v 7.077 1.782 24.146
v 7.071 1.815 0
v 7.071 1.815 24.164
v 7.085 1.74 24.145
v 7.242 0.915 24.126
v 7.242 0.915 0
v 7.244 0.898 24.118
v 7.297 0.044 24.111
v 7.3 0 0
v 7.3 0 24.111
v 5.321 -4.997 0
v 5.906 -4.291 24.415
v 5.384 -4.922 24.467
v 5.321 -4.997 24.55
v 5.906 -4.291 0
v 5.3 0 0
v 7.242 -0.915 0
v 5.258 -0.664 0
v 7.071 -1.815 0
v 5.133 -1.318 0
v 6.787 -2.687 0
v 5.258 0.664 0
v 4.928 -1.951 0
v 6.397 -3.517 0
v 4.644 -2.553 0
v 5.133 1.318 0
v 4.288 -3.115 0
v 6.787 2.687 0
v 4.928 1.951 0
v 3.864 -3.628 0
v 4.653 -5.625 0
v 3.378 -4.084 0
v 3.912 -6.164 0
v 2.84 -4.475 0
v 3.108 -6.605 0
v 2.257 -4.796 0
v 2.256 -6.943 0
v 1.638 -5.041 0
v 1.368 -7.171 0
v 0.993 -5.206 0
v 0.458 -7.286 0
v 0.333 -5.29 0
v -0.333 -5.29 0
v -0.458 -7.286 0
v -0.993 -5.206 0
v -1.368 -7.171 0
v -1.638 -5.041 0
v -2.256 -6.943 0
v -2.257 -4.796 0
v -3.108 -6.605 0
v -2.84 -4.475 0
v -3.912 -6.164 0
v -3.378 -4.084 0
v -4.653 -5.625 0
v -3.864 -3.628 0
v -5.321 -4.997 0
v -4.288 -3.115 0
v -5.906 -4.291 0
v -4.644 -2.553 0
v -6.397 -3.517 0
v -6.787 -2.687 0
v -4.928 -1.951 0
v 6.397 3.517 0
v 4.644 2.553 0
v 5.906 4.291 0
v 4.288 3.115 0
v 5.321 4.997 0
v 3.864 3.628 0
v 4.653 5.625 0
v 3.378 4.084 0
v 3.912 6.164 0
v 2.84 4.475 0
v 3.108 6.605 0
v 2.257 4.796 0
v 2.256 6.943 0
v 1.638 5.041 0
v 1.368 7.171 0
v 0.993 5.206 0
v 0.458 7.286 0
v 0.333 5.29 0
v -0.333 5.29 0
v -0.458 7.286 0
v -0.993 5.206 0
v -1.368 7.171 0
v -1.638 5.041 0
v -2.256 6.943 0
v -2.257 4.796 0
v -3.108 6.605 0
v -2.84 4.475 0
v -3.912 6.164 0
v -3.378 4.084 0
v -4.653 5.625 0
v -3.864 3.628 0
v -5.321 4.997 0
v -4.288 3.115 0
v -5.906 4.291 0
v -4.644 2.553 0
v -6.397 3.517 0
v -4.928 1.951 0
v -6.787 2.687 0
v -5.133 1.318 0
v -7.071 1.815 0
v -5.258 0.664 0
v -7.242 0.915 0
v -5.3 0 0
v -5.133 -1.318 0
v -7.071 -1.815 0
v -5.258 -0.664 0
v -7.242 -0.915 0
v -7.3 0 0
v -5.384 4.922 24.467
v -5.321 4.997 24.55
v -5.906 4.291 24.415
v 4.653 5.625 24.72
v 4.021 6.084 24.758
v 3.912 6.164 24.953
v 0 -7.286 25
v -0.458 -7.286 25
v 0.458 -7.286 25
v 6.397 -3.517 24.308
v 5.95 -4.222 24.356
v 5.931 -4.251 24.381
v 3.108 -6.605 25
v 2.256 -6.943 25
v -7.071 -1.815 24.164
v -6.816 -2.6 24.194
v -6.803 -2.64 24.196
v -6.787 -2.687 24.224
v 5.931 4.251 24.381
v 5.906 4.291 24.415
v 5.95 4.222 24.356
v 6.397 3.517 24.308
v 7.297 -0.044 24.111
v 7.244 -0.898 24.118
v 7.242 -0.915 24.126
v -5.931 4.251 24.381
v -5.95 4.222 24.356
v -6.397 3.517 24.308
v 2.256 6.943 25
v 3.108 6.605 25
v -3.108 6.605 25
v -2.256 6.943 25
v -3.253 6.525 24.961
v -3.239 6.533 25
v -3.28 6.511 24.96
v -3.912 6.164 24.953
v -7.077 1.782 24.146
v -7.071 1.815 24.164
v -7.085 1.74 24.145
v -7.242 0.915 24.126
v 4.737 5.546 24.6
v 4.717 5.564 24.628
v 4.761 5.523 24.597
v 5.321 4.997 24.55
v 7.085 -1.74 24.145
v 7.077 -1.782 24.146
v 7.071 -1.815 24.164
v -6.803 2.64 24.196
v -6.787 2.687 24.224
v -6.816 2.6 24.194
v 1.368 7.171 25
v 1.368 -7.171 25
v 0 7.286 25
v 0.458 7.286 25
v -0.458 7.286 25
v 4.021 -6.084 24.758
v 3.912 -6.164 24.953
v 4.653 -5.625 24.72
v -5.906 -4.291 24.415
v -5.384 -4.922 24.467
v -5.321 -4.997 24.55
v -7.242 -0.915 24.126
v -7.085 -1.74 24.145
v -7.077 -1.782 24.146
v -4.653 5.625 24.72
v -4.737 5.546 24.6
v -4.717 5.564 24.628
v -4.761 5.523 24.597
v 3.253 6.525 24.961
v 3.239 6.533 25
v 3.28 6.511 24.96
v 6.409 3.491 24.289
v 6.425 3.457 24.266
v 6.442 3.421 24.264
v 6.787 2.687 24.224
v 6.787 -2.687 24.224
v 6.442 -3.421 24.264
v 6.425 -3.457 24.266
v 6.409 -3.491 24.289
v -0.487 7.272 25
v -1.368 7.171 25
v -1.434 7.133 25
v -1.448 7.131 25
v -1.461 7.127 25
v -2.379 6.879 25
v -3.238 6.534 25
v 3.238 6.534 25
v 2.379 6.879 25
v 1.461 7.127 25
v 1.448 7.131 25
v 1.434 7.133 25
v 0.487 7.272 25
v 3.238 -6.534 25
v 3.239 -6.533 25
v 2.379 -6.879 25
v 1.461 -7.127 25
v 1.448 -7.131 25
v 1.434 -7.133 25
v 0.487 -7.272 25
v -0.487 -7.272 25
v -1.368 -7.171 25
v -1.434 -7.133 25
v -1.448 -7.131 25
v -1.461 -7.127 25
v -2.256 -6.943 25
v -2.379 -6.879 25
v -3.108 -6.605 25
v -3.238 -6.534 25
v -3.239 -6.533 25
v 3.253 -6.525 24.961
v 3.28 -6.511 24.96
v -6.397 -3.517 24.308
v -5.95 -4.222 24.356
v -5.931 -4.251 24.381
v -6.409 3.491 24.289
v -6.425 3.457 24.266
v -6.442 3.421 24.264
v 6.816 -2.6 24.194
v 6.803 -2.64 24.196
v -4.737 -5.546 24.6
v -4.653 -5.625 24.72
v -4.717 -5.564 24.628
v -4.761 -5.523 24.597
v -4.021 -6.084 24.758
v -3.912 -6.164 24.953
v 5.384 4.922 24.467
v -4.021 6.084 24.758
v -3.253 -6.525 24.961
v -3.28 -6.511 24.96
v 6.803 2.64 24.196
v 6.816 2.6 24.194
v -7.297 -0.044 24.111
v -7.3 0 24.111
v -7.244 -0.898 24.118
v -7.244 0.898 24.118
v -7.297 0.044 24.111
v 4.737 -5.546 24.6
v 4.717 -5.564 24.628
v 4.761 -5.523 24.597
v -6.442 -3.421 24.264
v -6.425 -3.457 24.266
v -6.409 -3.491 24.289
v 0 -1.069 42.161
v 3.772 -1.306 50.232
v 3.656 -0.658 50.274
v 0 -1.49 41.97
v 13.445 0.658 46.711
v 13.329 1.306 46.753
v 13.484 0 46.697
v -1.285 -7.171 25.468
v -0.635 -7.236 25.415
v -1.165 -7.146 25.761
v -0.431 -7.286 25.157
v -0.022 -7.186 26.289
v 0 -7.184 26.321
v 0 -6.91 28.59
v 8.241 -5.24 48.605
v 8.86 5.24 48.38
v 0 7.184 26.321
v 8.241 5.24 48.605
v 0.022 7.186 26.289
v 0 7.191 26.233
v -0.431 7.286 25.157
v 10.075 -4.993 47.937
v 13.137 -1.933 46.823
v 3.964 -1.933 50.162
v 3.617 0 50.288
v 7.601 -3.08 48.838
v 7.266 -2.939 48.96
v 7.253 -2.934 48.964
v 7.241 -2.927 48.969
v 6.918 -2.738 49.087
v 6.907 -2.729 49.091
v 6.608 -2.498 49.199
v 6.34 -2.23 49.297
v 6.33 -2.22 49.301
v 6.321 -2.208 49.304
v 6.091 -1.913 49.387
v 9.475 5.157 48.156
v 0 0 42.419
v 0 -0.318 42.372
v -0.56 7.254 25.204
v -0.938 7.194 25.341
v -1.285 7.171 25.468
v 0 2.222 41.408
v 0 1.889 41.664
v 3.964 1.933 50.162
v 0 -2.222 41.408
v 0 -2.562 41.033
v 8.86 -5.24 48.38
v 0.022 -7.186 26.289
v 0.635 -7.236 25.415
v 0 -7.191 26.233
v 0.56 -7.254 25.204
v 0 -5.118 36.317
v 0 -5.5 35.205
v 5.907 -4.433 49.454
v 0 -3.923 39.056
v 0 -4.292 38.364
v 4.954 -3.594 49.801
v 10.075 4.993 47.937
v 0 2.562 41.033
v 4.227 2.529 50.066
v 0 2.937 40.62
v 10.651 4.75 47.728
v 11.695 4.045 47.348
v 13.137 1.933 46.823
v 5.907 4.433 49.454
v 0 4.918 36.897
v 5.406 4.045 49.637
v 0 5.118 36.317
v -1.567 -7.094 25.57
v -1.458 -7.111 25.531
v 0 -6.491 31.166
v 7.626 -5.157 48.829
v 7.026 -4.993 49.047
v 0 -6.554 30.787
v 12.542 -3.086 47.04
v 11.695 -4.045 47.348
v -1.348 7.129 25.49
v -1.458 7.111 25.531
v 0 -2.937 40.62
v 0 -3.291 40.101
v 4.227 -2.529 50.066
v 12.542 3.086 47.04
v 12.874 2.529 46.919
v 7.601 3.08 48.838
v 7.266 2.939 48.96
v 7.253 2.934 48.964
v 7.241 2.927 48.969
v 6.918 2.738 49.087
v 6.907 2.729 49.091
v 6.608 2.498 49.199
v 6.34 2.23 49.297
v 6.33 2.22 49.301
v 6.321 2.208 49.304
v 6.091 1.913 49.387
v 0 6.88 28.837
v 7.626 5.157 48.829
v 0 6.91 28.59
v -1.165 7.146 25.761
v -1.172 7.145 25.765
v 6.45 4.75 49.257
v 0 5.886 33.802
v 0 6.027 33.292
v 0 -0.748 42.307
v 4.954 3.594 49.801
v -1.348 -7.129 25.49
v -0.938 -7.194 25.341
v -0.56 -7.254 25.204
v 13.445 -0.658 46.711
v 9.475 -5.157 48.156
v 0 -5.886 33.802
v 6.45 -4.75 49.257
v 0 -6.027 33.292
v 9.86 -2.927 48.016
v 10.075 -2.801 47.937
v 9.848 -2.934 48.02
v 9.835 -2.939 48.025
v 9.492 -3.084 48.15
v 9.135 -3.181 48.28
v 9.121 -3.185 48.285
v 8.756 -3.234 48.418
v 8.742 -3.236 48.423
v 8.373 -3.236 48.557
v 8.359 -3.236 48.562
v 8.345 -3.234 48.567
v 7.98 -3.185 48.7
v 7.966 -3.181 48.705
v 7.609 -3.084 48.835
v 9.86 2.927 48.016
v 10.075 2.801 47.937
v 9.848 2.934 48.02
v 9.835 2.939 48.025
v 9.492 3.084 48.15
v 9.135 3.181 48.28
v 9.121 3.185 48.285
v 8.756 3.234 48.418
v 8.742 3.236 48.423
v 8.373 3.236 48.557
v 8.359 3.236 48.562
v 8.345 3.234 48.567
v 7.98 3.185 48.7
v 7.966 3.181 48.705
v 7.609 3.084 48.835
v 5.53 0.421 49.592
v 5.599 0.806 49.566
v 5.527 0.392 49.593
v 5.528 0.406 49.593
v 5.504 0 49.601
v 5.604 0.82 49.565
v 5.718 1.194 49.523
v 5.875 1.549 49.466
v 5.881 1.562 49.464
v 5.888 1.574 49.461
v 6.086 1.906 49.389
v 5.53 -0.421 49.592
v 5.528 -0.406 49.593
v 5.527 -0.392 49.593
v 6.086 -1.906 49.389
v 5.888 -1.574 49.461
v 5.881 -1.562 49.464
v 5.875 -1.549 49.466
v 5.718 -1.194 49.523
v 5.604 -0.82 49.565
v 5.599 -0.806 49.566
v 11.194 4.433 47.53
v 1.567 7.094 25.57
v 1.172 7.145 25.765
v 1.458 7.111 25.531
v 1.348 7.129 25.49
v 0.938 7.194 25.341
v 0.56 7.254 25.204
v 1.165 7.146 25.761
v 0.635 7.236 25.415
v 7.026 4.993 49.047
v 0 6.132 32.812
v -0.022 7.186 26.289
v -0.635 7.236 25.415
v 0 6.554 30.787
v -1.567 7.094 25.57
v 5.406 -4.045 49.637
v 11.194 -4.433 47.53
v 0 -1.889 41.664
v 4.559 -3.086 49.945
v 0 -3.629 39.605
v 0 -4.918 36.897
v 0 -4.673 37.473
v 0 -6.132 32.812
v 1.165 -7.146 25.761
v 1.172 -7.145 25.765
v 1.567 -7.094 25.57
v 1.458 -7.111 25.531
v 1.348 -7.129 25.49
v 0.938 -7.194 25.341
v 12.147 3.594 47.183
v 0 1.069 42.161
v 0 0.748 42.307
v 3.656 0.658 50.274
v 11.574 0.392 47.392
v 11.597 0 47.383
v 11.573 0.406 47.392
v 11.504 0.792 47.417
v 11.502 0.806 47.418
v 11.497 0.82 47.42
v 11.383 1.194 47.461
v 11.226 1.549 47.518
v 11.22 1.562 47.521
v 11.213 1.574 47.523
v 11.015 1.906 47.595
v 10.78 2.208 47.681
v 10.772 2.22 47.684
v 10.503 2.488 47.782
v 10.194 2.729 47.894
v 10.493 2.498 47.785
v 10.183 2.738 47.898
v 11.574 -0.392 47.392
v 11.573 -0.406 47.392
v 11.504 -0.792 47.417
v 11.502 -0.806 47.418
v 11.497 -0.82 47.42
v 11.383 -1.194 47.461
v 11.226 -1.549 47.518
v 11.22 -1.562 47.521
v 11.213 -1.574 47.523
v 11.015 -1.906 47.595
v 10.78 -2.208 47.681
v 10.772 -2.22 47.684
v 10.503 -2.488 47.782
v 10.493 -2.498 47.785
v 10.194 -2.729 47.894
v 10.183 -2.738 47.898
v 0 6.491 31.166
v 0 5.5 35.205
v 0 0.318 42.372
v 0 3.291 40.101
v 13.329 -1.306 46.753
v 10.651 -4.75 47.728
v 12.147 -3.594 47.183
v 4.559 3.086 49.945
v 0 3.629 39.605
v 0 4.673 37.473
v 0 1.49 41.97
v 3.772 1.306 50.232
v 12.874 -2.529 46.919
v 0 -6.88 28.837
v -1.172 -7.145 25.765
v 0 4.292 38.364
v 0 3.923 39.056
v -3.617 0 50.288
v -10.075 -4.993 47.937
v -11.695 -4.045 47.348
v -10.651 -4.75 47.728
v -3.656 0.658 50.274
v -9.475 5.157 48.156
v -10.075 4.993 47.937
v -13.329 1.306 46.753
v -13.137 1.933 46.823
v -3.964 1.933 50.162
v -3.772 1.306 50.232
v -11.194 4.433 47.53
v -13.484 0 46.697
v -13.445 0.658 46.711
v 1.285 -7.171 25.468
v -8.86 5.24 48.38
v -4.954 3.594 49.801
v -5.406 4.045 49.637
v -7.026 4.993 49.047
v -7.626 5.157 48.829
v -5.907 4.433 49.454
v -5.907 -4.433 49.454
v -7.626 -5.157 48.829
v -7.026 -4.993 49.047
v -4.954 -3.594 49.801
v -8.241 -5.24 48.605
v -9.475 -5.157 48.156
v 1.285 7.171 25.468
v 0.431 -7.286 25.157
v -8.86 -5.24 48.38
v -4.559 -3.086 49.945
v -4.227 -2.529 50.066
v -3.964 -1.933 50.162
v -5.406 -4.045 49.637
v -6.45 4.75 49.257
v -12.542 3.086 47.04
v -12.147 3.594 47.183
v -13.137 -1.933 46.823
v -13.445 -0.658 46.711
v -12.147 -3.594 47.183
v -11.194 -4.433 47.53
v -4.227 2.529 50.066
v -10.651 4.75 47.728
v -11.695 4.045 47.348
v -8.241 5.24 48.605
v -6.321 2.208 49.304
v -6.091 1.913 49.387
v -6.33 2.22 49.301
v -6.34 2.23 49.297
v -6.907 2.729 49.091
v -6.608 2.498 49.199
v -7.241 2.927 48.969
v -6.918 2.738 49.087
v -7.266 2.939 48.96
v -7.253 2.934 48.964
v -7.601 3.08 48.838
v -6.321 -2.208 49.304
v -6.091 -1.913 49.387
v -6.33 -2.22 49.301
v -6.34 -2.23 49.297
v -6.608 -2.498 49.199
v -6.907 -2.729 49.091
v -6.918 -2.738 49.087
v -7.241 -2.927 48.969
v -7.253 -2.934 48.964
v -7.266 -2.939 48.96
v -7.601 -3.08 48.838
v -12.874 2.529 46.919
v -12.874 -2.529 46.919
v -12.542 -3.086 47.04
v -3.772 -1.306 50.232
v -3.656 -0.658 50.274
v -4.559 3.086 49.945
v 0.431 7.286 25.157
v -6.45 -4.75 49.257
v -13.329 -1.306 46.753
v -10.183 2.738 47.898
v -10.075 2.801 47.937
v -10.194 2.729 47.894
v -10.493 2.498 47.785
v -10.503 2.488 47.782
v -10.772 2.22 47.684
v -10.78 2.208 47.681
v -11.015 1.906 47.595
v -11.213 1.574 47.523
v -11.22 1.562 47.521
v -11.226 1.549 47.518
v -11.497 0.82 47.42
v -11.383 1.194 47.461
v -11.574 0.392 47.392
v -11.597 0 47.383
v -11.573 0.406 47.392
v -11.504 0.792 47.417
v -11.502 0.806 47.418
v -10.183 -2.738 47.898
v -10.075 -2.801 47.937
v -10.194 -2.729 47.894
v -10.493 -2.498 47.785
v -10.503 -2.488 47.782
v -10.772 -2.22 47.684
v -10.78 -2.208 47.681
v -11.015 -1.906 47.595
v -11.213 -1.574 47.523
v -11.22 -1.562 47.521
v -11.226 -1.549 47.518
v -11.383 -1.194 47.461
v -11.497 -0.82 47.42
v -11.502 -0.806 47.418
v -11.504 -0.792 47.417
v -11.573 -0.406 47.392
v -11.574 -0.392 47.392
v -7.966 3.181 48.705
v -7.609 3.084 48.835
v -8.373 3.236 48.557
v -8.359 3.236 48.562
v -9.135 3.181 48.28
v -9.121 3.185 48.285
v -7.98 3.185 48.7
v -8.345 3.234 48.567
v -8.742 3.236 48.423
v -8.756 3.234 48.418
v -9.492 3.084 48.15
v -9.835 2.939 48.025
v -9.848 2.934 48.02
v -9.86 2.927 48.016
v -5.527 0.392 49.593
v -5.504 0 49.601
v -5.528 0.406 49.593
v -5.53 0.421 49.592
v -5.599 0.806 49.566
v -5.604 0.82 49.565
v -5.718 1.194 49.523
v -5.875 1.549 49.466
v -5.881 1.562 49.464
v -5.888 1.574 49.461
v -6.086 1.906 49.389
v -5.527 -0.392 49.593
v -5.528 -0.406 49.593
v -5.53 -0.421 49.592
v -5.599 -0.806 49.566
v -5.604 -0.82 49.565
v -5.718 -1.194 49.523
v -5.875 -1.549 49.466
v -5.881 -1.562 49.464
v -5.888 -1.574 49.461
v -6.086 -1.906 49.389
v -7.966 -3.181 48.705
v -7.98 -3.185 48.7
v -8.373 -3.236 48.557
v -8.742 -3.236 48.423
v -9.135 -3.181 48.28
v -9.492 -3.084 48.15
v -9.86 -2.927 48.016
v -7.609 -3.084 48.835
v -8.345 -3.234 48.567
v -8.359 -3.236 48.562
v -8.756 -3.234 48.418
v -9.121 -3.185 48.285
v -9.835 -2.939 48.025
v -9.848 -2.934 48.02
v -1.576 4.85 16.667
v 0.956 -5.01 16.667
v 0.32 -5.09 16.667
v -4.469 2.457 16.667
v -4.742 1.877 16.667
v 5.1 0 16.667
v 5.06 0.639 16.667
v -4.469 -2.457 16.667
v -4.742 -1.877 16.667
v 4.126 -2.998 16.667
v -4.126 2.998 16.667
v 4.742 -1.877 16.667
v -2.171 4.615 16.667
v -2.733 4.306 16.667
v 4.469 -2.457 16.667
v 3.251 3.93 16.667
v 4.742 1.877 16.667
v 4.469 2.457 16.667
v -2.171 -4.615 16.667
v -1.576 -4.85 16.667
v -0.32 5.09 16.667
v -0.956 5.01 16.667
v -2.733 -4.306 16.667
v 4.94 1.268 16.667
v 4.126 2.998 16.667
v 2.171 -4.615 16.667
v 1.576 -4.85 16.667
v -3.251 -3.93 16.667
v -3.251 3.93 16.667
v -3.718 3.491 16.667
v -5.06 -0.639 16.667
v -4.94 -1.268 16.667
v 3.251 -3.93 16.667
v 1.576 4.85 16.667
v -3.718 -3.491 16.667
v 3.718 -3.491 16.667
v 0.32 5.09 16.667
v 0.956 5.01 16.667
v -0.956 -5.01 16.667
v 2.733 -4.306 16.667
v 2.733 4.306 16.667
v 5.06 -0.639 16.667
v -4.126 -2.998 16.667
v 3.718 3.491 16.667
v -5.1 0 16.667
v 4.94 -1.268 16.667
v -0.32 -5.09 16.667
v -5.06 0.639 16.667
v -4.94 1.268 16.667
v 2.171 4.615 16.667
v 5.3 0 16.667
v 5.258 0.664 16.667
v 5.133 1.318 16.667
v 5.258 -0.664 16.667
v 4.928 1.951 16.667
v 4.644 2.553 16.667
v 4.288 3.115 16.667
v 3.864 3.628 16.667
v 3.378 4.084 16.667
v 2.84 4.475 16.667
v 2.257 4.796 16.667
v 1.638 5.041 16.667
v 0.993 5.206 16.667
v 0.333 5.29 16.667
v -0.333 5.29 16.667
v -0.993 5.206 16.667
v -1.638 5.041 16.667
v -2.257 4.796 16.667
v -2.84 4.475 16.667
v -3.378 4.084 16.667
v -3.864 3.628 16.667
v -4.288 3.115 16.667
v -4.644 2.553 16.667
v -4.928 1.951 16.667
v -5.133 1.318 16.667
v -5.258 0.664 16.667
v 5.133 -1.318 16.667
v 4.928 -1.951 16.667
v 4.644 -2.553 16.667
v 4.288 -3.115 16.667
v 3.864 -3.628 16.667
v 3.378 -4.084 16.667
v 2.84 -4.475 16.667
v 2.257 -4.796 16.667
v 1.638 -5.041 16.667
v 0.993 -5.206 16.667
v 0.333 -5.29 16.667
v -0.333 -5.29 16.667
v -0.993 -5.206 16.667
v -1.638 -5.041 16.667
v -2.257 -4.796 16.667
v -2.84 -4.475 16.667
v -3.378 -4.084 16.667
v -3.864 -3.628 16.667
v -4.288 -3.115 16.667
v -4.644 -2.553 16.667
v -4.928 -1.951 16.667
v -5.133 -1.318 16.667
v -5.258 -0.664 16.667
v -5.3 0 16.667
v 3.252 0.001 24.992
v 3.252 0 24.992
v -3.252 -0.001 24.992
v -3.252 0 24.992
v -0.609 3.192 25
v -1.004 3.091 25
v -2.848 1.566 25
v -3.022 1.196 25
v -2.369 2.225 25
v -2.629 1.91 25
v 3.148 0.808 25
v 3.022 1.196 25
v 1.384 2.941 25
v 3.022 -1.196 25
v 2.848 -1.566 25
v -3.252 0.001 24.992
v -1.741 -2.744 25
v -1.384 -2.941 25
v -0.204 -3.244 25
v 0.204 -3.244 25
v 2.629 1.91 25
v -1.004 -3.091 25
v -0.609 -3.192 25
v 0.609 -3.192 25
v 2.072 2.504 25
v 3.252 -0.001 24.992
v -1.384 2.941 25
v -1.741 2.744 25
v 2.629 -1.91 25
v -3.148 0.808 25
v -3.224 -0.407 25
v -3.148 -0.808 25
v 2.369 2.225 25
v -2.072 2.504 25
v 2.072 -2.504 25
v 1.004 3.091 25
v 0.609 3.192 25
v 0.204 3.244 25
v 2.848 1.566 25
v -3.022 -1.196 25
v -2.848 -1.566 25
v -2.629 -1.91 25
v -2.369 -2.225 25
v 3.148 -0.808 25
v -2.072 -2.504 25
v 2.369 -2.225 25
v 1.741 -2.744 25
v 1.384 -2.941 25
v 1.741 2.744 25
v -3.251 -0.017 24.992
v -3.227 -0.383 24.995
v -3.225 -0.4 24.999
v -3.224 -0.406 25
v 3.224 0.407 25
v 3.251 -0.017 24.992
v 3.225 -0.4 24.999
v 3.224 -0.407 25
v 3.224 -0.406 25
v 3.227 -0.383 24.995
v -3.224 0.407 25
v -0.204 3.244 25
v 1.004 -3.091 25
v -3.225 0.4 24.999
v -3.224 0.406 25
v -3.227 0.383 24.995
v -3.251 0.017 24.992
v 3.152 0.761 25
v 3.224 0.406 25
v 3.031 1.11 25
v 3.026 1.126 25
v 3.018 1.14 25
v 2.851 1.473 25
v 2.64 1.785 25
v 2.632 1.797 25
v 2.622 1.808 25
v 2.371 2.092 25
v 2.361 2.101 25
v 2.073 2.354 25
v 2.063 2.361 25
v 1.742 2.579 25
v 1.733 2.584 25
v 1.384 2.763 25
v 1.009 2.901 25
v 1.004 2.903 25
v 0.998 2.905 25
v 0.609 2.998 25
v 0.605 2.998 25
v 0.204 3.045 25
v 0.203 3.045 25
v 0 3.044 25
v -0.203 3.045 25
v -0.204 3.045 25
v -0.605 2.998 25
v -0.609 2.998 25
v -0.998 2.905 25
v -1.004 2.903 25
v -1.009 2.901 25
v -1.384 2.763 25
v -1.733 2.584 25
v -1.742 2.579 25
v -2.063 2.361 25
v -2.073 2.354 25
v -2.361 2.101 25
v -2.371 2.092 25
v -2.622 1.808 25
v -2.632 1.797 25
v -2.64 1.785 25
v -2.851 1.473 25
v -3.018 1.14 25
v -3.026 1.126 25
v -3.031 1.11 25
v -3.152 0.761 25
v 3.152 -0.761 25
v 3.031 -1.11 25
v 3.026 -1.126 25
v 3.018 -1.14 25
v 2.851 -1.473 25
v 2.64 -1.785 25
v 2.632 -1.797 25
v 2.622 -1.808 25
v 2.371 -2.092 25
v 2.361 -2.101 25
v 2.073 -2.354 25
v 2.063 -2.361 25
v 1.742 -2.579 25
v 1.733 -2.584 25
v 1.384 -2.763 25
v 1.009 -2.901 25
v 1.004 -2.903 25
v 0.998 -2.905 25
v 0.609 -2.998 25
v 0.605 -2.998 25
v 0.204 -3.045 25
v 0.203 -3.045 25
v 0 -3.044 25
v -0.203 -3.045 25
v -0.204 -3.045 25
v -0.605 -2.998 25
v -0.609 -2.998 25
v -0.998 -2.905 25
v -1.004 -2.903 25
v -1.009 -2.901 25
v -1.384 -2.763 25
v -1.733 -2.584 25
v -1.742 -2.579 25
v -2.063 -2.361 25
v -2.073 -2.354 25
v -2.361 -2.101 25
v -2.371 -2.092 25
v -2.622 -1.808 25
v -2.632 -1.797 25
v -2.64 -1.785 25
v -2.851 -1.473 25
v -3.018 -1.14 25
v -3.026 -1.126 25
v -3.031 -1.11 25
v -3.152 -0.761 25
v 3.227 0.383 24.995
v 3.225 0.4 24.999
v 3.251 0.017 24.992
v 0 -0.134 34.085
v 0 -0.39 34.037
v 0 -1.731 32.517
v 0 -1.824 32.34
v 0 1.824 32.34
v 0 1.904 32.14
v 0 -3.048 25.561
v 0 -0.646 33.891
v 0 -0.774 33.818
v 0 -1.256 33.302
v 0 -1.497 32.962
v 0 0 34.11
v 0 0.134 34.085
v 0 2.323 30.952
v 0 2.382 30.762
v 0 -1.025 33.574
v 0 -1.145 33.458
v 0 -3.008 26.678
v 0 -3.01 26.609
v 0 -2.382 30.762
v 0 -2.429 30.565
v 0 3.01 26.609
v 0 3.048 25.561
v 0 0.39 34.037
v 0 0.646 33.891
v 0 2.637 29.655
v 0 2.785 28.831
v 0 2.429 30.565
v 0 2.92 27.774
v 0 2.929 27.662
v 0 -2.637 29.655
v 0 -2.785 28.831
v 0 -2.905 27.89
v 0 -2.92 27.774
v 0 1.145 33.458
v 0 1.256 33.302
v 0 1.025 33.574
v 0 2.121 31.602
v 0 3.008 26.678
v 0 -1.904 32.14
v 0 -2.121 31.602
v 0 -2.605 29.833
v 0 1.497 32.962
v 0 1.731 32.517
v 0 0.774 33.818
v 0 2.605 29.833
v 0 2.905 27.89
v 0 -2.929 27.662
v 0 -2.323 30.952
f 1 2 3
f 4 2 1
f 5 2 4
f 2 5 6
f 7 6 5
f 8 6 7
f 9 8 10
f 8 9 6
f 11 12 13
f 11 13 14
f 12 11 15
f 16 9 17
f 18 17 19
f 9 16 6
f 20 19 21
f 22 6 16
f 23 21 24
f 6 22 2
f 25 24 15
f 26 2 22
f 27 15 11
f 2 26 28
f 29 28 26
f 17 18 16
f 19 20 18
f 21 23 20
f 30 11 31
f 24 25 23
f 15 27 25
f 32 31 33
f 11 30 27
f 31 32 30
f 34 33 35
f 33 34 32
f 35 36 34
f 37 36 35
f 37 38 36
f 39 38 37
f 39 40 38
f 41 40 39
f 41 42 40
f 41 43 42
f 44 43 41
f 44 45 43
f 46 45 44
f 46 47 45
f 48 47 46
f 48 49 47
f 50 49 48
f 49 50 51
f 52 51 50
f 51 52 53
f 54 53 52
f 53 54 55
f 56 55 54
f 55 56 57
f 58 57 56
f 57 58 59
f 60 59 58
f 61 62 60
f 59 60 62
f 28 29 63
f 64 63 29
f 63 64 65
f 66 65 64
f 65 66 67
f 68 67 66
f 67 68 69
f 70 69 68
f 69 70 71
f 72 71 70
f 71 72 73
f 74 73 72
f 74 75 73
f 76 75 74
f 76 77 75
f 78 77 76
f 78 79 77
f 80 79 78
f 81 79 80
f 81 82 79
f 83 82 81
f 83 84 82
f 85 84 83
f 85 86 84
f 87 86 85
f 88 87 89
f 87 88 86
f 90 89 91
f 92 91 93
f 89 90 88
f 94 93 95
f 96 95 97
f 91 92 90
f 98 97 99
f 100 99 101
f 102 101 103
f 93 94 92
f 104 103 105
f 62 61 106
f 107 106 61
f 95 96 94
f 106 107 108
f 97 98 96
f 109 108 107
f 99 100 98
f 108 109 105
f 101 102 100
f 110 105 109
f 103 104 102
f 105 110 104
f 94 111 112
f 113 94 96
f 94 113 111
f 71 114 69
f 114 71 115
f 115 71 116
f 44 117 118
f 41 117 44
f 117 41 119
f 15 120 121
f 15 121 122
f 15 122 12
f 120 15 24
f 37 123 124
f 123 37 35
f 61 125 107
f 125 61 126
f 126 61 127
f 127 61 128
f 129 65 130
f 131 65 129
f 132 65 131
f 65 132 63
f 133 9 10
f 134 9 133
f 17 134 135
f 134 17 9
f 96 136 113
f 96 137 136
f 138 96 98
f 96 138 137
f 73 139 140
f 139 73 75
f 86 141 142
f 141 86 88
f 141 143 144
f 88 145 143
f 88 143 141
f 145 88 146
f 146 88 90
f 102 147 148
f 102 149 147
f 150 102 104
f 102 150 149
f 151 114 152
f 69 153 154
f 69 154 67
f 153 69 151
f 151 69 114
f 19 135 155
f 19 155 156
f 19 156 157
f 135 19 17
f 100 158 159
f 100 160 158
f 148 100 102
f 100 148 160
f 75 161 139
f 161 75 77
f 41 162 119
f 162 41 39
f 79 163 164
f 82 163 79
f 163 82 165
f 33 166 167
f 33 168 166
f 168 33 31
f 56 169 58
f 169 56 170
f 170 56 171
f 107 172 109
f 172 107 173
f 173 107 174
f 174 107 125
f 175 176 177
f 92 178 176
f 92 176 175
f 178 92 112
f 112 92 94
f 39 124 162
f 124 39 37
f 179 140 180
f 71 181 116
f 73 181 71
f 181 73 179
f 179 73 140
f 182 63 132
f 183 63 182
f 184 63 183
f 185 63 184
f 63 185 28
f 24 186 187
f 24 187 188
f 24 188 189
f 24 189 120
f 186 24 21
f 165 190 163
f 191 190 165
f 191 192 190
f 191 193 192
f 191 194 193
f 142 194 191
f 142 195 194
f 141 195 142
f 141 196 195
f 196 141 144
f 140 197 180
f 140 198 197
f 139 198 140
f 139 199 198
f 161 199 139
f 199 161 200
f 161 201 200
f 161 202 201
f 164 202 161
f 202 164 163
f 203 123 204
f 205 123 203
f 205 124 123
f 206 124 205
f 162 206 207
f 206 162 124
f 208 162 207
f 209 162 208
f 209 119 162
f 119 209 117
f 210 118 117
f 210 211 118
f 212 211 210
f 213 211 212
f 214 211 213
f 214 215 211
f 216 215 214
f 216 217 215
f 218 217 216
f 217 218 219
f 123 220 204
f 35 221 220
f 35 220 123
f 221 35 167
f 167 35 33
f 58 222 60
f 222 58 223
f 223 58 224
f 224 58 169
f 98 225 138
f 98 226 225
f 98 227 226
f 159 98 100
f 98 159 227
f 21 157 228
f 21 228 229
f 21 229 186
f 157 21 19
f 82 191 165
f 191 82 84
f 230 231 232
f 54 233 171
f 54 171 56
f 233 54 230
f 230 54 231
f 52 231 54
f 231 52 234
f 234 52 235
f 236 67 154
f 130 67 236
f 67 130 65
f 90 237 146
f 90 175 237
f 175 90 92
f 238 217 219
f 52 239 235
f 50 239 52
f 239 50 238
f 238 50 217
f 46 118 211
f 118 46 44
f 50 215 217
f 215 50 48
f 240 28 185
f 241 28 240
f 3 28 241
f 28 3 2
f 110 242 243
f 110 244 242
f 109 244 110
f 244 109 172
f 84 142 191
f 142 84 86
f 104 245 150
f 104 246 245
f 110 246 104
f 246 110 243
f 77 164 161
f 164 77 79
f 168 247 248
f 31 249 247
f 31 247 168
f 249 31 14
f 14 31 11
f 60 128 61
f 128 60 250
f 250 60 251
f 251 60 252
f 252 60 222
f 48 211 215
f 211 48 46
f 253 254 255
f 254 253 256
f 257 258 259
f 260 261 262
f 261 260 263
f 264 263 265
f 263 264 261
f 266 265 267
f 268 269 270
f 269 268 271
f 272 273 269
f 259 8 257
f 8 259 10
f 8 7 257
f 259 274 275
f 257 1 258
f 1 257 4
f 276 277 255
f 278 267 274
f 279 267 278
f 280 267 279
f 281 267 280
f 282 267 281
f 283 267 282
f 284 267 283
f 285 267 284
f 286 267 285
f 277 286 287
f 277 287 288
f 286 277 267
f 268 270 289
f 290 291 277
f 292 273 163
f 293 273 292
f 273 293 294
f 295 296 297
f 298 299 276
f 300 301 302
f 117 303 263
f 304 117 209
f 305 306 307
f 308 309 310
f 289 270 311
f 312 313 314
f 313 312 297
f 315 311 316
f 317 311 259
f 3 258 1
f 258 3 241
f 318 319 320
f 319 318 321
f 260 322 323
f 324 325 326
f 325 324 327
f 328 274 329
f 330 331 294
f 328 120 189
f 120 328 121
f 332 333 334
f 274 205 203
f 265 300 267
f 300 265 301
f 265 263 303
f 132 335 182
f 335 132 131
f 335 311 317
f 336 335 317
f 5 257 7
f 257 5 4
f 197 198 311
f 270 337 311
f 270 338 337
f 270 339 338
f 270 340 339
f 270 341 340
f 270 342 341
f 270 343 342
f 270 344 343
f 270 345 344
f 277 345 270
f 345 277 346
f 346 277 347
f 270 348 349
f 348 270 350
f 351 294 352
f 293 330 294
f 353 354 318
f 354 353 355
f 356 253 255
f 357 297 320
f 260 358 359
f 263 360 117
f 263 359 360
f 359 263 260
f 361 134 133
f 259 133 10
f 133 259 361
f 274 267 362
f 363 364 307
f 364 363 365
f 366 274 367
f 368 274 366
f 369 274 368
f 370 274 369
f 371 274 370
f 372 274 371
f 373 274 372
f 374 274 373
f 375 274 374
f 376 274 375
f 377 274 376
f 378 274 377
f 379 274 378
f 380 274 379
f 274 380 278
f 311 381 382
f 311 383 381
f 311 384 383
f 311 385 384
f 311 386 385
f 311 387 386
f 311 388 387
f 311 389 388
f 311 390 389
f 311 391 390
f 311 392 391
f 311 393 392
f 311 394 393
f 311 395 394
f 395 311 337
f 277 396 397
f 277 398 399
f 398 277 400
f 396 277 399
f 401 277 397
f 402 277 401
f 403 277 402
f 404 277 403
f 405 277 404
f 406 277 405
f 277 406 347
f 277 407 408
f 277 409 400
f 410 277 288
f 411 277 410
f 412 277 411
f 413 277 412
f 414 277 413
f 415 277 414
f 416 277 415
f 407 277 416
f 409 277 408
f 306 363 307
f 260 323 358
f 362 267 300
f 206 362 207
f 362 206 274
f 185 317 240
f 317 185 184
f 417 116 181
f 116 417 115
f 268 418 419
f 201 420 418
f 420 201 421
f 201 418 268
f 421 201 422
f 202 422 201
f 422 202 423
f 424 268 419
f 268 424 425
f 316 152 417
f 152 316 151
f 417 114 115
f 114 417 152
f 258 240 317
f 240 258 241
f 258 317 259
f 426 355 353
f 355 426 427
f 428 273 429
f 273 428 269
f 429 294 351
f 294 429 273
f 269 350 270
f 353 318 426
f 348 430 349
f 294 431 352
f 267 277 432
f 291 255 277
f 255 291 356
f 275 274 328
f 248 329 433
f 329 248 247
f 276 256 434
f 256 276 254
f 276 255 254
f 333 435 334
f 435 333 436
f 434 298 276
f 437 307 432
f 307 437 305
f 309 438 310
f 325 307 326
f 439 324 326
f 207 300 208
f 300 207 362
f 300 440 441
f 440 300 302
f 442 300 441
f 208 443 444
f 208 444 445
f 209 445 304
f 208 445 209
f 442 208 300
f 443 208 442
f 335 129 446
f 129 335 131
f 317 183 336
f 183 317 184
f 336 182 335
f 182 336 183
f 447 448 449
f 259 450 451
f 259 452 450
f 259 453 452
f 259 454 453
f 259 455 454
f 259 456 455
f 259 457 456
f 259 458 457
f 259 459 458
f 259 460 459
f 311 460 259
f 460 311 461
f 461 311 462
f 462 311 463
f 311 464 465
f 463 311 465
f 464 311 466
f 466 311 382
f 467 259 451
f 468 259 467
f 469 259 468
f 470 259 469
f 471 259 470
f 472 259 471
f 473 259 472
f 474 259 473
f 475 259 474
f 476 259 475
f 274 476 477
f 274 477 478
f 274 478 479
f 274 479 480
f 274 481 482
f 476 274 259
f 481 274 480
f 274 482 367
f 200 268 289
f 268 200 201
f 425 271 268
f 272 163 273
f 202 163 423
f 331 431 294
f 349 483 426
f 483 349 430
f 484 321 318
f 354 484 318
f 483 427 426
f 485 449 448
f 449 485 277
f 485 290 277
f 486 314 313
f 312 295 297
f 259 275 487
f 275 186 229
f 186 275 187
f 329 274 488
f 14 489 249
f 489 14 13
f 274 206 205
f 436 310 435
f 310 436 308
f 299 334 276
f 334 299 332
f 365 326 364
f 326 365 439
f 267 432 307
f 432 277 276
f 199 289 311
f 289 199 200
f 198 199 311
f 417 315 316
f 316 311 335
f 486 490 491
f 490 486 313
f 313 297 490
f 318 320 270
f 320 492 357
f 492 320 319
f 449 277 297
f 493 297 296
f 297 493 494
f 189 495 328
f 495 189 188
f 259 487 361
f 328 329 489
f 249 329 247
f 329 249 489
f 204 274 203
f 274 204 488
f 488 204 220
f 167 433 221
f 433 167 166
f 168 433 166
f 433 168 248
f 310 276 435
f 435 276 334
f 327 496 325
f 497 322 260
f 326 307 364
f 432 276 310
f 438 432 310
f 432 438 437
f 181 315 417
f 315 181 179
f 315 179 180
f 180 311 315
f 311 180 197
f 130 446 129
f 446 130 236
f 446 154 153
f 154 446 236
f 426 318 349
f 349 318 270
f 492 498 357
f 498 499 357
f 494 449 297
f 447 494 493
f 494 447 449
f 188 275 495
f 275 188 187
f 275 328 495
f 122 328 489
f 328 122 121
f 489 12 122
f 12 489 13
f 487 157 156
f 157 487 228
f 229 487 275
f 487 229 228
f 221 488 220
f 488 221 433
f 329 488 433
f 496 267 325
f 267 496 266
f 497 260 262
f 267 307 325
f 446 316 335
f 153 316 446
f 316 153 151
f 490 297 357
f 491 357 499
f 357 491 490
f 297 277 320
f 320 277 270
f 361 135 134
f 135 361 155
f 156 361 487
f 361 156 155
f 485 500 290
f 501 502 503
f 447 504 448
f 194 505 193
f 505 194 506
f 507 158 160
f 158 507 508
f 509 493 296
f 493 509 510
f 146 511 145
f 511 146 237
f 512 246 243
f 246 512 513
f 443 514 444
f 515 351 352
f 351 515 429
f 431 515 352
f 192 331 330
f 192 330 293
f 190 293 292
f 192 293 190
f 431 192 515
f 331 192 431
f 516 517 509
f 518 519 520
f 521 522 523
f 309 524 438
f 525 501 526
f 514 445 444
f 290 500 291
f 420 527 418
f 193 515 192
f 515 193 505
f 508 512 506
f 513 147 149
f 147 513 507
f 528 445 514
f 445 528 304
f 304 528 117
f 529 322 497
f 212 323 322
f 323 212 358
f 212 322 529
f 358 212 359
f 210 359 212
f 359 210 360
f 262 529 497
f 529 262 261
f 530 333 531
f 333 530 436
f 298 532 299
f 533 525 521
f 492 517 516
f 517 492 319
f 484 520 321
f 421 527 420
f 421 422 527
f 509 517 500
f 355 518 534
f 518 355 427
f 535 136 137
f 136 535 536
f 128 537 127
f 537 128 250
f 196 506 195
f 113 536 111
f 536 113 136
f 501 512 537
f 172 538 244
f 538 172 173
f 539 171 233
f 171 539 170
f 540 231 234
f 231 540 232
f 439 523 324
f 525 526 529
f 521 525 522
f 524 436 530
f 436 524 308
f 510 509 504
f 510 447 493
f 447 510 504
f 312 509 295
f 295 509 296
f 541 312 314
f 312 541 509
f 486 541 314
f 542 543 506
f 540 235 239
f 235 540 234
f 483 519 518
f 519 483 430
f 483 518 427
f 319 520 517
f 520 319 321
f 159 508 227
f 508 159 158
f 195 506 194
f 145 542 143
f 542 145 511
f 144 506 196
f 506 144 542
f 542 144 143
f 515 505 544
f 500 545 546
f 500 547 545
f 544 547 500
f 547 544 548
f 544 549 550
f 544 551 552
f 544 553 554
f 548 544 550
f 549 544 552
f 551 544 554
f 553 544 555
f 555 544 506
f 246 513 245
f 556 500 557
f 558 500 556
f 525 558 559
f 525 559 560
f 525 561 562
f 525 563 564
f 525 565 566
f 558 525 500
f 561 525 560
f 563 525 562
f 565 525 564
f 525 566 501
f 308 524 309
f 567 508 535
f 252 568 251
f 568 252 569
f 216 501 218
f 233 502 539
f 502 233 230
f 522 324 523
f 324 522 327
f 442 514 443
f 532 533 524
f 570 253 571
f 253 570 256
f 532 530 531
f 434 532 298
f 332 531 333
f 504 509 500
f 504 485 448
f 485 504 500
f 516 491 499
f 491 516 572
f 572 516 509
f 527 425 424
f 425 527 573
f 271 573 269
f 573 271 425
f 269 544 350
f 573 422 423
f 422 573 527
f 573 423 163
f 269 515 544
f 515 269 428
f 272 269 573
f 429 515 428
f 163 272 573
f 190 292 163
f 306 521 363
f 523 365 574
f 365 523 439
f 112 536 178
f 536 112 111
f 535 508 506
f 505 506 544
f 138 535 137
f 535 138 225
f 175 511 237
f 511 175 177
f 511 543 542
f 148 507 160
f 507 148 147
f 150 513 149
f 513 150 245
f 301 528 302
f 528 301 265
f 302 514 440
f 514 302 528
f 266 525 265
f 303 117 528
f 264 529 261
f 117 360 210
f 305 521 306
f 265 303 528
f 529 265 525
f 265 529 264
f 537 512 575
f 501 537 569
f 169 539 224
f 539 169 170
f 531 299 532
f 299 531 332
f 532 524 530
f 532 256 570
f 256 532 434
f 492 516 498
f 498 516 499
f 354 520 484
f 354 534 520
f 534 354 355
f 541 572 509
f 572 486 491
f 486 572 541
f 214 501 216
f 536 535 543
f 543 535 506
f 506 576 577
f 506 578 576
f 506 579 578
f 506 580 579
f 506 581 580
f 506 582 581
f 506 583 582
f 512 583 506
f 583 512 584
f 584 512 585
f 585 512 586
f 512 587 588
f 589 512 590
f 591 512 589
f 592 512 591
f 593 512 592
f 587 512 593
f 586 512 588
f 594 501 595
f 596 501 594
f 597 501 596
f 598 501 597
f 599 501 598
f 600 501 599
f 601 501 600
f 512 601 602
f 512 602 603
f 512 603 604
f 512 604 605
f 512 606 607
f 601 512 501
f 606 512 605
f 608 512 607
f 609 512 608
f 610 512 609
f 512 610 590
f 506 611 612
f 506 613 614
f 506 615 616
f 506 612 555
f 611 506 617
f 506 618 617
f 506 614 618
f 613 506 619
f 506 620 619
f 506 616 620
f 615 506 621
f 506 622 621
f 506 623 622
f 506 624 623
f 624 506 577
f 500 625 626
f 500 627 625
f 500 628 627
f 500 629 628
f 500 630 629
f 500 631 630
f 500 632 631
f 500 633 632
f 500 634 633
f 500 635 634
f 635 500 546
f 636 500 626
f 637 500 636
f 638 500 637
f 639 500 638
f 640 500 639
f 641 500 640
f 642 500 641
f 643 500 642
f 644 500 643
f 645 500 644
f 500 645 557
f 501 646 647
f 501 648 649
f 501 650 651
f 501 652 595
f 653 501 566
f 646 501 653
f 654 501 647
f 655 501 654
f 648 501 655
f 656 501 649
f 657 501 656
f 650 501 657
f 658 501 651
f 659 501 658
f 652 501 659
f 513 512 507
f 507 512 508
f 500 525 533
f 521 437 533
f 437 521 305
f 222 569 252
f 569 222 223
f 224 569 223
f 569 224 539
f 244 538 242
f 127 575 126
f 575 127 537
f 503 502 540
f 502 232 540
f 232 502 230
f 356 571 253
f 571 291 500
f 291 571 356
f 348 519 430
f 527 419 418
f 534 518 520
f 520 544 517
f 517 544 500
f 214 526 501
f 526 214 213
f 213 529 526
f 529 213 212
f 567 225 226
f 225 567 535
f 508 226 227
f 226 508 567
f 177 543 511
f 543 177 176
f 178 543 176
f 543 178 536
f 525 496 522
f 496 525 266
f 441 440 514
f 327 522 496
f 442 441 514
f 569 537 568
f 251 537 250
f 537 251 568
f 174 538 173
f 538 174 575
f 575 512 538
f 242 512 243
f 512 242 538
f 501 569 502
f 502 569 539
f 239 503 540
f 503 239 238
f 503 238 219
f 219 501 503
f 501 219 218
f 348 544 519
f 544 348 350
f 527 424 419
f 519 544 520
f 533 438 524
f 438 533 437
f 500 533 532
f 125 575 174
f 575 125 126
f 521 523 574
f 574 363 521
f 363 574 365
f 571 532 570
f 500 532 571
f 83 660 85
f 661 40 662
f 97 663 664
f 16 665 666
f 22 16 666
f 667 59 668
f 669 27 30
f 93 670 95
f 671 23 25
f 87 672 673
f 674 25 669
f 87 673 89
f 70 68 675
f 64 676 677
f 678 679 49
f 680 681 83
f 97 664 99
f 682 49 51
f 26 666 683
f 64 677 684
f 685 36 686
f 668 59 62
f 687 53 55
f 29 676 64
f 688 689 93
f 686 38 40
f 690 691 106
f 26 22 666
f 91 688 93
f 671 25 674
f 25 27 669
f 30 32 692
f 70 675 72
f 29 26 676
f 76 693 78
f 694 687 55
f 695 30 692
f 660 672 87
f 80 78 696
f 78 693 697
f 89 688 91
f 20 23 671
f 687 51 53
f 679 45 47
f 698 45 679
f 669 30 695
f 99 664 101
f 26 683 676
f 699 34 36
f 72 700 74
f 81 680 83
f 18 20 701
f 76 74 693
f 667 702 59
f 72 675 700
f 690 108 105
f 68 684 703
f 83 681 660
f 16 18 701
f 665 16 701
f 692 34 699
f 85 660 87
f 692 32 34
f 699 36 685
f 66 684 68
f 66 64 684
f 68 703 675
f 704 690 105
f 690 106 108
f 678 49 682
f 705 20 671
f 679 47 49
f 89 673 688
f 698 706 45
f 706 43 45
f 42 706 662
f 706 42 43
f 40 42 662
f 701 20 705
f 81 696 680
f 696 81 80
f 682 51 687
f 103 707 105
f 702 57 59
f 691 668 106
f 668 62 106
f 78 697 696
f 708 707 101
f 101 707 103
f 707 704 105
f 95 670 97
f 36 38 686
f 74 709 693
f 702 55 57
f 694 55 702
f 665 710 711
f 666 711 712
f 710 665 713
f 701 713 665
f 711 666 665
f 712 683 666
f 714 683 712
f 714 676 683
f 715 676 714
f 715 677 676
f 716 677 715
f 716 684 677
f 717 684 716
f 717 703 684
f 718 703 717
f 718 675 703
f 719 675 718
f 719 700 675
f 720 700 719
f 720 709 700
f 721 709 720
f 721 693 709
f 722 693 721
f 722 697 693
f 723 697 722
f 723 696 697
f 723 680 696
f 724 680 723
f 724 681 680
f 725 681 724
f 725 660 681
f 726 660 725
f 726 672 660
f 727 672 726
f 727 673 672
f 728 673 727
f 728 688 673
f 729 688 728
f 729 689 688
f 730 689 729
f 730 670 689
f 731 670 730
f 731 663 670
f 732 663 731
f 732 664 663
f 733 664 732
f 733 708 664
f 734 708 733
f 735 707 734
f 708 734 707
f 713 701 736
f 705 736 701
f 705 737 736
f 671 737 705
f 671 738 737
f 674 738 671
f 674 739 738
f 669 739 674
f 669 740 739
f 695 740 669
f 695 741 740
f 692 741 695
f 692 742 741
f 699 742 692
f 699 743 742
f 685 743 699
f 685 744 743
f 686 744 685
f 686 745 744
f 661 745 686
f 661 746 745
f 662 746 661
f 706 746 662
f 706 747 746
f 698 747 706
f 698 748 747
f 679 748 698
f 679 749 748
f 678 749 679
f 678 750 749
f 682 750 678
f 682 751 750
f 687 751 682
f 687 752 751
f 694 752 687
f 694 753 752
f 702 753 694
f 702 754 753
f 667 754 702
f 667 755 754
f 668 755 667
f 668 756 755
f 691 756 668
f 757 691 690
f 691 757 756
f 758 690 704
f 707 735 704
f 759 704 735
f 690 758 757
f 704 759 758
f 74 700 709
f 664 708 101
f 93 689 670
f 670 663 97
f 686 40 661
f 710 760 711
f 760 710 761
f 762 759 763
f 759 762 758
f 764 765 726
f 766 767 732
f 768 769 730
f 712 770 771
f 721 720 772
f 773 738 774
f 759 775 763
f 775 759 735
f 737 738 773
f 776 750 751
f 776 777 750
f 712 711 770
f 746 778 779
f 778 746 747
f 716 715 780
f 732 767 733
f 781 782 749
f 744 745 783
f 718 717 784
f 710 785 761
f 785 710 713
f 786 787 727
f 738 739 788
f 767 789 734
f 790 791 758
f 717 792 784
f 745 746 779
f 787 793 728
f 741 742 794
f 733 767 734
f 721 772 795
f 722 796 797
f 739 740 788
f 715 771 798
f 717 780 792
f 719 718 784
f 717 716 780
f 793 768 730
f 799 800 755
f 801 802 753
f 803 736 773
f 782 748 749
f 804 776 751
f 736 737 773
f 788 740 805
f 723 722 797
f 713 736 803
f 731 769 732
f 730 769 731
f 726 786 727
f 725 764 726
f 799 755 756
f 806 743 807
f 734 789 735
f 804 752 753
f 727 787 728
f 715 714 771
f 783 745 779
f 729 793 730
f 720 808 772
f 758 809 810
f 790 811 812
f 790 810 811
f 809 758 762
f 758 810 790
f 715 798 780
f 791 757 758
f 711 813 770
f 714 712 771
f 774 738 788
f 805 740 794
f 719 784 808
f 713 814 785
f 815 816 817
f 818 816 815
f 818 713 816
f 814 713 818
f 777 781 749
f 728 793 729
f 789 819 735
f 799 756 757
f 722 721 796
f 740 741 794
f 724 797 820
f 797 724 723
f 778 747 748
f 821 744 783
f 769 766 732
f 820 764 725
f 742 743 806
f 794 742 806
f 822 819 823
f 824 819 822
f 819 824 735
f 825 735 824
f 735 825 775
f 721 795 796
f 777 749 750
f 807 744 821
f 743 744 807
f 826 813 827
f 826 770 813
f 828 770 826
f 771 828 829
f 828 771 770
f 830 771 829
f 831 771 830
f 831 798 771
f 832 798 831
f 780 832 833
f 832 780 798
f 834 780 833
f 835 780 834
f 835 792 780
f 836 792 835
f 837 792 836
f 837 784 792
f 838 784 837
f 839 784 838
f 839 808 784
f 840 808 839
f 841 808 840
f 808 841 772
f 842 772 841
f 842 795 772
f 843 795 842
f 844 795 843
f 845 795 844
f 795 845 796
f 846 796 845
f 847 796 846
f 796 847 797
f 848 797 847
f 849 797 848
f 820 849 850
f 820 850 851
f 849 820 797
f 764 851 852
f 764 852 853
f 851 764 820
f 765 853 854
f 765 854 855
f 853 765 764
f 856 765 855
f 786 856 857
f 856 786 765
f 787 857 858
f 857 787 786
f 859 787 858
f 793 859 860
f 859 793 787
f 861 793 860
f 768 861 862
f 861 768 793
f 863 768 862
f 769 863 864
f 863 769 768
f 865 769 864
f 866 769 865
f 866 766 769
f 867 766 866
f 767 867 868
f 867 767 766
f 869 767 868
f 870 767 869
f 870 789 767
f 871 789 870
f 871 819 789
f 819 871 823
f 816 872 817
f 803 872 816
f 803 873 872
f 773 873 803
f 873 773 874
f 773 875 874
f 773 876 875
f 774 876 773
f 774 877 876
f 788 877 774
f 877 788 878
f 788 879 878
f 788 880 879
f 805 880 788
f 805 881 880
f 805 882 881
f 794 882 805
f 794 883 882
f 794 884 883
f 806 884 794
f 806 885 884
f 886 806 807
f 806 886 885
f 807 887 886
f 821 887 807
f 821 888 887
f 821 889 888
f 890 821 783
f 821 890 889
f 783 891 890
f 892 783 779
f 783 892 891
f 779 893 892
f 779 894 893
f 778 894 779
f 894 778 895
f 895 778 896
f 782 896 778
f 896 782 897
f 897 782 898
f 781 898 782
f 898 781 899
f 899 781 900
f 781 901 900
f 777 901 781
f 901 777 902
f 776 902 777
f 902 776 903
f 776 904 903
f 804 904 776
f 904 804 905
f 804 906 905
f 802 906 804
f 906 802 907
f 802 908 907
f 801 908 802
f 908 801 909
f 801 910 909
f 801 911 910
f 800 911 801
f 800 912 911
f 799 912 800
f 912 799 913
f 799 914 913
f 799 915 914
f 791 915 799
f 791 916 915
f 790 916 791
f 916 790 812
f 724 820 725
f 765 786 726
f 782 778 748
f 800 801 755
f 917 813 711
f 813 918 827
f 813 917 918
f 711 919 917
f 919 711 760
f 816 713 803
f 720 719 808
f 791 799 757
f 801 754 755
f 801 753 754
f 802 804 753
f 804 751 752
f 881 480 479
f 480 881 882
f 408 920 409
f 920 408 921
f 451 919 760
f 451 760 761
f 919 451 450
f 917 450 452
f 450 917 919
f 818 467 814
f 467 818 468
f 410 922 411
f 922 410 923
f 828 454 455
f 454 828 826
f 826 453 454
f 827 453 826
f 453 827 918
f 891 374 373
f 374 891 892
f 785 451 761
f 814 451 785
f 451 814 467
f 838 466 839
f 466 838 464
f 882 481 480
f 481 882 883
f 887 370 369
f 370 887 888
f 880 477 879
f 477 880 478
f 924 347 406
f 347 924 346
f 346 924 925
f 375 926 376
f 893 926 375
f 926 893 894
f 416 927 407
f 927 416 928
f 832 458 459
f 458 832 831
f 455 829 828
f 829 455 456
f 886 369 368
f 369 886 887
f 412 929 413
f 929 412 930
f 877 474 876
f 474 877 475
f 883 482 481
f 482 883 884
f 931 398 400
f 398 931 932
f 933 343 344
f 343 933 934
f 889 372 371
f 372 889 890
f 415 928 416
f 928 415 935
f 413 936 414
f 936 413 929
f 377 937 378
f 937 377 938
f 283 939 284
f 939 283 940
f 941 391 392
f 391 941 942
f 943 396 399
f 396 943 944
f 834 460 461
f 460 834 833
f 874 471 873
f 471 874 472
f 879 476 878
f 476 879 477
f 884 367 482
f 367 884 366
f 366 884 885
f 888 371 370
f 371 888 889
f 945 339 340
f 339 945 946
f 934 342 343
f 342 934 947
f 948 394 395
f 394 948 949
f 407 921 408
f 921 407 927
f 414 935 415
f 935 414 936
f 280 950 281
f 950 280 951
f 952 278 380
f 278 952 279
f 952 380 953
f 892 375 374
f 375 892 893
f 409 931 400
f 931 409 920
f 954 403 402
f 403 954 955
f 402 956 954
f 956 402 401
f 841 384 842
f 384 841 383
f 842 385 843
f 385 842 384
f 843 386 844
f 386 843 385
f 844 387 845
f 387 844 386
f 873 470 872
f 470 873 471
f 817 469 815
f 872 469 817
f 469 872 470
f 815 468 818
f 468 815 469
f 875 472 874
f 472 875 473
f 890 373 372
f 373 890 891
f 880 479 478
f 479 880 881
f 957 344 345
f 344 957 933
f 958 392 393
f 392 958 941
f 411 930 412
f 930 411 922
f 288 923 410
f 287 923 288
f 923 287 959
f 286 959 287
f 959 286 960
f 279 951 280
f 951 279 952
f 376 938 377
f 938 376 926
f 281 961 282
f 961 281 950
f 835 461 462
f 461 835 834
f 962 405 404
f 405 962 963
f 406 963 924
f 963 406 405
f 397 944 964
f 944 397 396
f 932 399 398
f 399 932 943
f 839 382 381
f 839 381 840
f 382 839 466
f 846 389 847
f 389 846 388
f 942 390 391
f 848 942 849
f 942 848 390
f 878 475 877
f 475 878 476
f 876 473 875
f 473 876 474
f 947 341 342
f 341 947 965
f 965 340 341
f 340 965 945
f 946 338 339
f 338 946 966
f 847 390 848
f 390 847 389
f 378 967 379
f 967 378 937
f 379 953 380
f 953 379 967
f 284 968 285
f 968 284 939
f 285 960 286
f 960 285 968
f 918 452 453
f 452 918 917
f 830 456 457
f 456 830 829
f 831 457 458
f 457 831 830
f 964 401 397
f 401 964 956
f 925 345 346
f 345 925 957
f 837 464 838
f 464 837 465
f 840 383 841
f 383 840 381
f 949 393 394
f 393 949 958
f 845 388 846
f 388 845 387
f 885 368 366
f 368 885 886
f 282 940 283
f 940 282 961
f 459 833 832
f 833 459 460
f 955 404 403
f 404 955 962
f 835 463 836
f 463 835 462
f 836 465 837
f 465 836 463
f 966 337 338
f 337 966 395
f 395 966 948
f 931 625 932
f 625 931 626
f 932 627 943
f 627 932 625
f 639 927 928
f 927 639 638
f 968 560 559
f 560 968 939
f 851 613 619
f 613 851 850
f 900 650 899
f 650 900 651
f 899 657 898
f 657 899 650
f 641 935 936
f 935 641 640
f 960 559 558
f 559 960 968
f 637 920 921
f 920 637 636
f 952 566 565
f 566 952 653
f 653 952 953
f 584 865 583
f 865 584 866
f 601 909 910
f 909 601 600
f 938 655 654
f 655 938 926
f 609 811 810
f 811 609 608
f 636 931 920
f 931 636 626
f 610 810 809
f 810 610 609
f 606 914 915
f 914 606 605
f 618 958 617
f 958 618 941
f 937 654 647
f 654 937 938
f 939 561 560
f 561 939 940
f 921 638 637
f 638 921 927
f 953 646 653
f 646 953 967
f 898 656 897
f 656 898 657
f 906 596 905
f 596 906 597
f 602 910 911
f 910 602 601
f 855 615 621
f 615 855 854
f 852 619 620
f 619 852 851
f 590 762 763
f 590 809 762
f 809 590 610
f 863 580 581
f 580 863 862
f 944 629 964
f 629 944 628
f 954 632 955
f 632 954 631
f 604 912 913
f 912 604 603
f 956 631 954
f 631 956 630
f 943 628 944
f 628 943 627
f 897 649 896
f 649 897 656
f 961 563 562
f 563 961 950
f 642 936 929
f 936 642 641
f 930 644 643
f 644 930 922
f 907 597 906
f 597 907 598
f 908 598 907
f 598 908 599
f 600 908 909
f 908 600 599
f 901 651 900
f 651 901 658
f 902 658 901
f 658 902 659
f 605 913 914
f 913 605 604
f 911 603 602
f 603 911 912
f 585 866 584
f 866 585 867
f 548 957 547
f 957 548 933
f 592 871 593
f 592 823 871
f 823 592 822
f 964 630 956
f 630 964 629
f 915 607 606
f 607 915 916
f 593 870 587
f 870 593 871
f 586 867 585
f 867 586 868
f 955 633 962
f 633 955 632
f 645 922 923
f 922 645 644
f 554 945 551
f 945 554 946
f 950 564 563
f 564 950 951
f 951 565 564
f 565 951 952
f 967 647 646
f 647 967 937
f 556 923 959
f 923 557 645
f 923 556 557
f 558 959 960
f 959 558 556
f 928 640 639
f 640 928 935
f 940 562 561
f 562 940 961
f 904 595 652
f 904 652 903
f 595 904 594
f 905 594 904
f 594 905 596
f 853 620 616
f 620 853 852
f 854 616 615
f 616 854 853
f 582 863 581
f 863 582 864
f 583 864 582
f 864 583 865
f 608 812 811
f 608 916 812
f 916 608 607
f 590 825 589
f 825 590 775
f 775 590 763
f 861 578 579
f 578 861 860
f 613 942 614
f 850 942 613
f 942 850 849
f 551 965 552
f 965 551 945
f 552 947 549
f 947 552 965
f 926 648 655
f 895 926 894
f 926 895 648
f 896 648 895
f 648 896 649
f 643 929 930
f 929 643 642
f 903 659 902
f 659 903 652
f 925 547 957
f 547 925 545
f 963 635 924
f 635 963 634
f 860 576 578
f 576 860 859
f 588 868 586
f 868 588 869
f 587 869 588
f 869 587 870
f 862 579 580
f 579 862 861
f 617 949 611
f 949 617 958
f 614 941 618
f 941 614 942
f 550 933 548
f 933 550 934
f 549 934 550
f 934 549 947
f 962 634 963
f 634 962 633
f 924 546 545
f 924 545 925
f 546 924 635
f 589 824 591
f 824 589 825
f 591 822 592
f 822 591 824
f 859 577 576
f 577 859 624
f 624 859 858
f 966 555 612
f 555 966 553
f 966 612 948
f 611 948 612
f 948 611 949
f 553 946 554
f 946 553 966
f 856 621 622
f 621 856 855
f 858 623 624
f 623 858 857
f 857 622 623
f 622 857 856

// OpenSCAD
PRIMARY_TUBE_DIAMETER = 10.6;
PRIMARY_TUBE_HEIGHT = 25;
SECONDARY_TUBE_DIAMETER = 6.5;
JUNCTION_HEIGHT = 25;

TIGHTENING_TOLERANCE = 0.4;

TUBE_THICKNESS = 2;

$fn = 50;

difference() {
    union () {
    cylinder(h = PRIMARY_TUBE_HEIGHT, d = PRIMARY_TUBE_DIAMETER + 2 * TUBE_THICKNESS);


    translate([0, 0, PRIMARY_TUBE_HEIGHT]) rotate([0, 20, 0]) cylinder(h = JUNCTION_HEIGHT, d1 = PRIMARY_TUBE_DIAMETER + 2 * TUBE_THICKNESS,d2 = SECONDARY_TUBE_DIAMETER + 2 * TUBE_THICKNESS);

    translate([0, 0, PRIMARY_TUBE_HEIGHT]) rotate([0, -20, 0]) cylinder(h = JUNCTION_HEIGHT, d1 = PRIMARY_TUBE_DIAMETER + 2 * TUBE_THICKNESS,d2 = SECONDARY_TUBE_DIAMETER + 2 * TUBE_THICKNESS);
        
    }
    
    cylinder(h = PRIMARY_TUBE_HEIGHT / 3 * 2, d1 = PRIMARY_TUBE_DIAMETER, d2 = PRIMARY_TUBE_DIAMETER - TIGHTENING_TOLERANCE);
   
    translate([0, 0, PRIMARY_TUBE_HEIGHT / 3 * 2]) cylinder(h = PRIMARY_TUBE_HEIGHT / 3, d1 = PRIMARY_TUBE_DIAMETER, d2 = SECONDARY_TUBE_DIAMETER);   
    
    translate([0, 0, PRIMARY_TUBE_HEIGHT]) rotate([0, 20, 0]) cylinder(h = JUNCTION_HEIGHT + 1, d1 = SECONDARY_TUBE_DIAMETER - TIGHTENING_TOLERANCE, d2 = SECONDARY_TUBE_DIAMETER);

    translate([0, 0, PRIMARY_TUBE_HEIGHT]) rotate([0, -20, 0]) cylinder(h = JUNCTION_HEIGHT + 1, d1 = SECONDARY_TUBE_DIAMETER - TIGHTENING_TOLERANCE, d2 = SECONDARY_TUBE_DIAMETER);
}
